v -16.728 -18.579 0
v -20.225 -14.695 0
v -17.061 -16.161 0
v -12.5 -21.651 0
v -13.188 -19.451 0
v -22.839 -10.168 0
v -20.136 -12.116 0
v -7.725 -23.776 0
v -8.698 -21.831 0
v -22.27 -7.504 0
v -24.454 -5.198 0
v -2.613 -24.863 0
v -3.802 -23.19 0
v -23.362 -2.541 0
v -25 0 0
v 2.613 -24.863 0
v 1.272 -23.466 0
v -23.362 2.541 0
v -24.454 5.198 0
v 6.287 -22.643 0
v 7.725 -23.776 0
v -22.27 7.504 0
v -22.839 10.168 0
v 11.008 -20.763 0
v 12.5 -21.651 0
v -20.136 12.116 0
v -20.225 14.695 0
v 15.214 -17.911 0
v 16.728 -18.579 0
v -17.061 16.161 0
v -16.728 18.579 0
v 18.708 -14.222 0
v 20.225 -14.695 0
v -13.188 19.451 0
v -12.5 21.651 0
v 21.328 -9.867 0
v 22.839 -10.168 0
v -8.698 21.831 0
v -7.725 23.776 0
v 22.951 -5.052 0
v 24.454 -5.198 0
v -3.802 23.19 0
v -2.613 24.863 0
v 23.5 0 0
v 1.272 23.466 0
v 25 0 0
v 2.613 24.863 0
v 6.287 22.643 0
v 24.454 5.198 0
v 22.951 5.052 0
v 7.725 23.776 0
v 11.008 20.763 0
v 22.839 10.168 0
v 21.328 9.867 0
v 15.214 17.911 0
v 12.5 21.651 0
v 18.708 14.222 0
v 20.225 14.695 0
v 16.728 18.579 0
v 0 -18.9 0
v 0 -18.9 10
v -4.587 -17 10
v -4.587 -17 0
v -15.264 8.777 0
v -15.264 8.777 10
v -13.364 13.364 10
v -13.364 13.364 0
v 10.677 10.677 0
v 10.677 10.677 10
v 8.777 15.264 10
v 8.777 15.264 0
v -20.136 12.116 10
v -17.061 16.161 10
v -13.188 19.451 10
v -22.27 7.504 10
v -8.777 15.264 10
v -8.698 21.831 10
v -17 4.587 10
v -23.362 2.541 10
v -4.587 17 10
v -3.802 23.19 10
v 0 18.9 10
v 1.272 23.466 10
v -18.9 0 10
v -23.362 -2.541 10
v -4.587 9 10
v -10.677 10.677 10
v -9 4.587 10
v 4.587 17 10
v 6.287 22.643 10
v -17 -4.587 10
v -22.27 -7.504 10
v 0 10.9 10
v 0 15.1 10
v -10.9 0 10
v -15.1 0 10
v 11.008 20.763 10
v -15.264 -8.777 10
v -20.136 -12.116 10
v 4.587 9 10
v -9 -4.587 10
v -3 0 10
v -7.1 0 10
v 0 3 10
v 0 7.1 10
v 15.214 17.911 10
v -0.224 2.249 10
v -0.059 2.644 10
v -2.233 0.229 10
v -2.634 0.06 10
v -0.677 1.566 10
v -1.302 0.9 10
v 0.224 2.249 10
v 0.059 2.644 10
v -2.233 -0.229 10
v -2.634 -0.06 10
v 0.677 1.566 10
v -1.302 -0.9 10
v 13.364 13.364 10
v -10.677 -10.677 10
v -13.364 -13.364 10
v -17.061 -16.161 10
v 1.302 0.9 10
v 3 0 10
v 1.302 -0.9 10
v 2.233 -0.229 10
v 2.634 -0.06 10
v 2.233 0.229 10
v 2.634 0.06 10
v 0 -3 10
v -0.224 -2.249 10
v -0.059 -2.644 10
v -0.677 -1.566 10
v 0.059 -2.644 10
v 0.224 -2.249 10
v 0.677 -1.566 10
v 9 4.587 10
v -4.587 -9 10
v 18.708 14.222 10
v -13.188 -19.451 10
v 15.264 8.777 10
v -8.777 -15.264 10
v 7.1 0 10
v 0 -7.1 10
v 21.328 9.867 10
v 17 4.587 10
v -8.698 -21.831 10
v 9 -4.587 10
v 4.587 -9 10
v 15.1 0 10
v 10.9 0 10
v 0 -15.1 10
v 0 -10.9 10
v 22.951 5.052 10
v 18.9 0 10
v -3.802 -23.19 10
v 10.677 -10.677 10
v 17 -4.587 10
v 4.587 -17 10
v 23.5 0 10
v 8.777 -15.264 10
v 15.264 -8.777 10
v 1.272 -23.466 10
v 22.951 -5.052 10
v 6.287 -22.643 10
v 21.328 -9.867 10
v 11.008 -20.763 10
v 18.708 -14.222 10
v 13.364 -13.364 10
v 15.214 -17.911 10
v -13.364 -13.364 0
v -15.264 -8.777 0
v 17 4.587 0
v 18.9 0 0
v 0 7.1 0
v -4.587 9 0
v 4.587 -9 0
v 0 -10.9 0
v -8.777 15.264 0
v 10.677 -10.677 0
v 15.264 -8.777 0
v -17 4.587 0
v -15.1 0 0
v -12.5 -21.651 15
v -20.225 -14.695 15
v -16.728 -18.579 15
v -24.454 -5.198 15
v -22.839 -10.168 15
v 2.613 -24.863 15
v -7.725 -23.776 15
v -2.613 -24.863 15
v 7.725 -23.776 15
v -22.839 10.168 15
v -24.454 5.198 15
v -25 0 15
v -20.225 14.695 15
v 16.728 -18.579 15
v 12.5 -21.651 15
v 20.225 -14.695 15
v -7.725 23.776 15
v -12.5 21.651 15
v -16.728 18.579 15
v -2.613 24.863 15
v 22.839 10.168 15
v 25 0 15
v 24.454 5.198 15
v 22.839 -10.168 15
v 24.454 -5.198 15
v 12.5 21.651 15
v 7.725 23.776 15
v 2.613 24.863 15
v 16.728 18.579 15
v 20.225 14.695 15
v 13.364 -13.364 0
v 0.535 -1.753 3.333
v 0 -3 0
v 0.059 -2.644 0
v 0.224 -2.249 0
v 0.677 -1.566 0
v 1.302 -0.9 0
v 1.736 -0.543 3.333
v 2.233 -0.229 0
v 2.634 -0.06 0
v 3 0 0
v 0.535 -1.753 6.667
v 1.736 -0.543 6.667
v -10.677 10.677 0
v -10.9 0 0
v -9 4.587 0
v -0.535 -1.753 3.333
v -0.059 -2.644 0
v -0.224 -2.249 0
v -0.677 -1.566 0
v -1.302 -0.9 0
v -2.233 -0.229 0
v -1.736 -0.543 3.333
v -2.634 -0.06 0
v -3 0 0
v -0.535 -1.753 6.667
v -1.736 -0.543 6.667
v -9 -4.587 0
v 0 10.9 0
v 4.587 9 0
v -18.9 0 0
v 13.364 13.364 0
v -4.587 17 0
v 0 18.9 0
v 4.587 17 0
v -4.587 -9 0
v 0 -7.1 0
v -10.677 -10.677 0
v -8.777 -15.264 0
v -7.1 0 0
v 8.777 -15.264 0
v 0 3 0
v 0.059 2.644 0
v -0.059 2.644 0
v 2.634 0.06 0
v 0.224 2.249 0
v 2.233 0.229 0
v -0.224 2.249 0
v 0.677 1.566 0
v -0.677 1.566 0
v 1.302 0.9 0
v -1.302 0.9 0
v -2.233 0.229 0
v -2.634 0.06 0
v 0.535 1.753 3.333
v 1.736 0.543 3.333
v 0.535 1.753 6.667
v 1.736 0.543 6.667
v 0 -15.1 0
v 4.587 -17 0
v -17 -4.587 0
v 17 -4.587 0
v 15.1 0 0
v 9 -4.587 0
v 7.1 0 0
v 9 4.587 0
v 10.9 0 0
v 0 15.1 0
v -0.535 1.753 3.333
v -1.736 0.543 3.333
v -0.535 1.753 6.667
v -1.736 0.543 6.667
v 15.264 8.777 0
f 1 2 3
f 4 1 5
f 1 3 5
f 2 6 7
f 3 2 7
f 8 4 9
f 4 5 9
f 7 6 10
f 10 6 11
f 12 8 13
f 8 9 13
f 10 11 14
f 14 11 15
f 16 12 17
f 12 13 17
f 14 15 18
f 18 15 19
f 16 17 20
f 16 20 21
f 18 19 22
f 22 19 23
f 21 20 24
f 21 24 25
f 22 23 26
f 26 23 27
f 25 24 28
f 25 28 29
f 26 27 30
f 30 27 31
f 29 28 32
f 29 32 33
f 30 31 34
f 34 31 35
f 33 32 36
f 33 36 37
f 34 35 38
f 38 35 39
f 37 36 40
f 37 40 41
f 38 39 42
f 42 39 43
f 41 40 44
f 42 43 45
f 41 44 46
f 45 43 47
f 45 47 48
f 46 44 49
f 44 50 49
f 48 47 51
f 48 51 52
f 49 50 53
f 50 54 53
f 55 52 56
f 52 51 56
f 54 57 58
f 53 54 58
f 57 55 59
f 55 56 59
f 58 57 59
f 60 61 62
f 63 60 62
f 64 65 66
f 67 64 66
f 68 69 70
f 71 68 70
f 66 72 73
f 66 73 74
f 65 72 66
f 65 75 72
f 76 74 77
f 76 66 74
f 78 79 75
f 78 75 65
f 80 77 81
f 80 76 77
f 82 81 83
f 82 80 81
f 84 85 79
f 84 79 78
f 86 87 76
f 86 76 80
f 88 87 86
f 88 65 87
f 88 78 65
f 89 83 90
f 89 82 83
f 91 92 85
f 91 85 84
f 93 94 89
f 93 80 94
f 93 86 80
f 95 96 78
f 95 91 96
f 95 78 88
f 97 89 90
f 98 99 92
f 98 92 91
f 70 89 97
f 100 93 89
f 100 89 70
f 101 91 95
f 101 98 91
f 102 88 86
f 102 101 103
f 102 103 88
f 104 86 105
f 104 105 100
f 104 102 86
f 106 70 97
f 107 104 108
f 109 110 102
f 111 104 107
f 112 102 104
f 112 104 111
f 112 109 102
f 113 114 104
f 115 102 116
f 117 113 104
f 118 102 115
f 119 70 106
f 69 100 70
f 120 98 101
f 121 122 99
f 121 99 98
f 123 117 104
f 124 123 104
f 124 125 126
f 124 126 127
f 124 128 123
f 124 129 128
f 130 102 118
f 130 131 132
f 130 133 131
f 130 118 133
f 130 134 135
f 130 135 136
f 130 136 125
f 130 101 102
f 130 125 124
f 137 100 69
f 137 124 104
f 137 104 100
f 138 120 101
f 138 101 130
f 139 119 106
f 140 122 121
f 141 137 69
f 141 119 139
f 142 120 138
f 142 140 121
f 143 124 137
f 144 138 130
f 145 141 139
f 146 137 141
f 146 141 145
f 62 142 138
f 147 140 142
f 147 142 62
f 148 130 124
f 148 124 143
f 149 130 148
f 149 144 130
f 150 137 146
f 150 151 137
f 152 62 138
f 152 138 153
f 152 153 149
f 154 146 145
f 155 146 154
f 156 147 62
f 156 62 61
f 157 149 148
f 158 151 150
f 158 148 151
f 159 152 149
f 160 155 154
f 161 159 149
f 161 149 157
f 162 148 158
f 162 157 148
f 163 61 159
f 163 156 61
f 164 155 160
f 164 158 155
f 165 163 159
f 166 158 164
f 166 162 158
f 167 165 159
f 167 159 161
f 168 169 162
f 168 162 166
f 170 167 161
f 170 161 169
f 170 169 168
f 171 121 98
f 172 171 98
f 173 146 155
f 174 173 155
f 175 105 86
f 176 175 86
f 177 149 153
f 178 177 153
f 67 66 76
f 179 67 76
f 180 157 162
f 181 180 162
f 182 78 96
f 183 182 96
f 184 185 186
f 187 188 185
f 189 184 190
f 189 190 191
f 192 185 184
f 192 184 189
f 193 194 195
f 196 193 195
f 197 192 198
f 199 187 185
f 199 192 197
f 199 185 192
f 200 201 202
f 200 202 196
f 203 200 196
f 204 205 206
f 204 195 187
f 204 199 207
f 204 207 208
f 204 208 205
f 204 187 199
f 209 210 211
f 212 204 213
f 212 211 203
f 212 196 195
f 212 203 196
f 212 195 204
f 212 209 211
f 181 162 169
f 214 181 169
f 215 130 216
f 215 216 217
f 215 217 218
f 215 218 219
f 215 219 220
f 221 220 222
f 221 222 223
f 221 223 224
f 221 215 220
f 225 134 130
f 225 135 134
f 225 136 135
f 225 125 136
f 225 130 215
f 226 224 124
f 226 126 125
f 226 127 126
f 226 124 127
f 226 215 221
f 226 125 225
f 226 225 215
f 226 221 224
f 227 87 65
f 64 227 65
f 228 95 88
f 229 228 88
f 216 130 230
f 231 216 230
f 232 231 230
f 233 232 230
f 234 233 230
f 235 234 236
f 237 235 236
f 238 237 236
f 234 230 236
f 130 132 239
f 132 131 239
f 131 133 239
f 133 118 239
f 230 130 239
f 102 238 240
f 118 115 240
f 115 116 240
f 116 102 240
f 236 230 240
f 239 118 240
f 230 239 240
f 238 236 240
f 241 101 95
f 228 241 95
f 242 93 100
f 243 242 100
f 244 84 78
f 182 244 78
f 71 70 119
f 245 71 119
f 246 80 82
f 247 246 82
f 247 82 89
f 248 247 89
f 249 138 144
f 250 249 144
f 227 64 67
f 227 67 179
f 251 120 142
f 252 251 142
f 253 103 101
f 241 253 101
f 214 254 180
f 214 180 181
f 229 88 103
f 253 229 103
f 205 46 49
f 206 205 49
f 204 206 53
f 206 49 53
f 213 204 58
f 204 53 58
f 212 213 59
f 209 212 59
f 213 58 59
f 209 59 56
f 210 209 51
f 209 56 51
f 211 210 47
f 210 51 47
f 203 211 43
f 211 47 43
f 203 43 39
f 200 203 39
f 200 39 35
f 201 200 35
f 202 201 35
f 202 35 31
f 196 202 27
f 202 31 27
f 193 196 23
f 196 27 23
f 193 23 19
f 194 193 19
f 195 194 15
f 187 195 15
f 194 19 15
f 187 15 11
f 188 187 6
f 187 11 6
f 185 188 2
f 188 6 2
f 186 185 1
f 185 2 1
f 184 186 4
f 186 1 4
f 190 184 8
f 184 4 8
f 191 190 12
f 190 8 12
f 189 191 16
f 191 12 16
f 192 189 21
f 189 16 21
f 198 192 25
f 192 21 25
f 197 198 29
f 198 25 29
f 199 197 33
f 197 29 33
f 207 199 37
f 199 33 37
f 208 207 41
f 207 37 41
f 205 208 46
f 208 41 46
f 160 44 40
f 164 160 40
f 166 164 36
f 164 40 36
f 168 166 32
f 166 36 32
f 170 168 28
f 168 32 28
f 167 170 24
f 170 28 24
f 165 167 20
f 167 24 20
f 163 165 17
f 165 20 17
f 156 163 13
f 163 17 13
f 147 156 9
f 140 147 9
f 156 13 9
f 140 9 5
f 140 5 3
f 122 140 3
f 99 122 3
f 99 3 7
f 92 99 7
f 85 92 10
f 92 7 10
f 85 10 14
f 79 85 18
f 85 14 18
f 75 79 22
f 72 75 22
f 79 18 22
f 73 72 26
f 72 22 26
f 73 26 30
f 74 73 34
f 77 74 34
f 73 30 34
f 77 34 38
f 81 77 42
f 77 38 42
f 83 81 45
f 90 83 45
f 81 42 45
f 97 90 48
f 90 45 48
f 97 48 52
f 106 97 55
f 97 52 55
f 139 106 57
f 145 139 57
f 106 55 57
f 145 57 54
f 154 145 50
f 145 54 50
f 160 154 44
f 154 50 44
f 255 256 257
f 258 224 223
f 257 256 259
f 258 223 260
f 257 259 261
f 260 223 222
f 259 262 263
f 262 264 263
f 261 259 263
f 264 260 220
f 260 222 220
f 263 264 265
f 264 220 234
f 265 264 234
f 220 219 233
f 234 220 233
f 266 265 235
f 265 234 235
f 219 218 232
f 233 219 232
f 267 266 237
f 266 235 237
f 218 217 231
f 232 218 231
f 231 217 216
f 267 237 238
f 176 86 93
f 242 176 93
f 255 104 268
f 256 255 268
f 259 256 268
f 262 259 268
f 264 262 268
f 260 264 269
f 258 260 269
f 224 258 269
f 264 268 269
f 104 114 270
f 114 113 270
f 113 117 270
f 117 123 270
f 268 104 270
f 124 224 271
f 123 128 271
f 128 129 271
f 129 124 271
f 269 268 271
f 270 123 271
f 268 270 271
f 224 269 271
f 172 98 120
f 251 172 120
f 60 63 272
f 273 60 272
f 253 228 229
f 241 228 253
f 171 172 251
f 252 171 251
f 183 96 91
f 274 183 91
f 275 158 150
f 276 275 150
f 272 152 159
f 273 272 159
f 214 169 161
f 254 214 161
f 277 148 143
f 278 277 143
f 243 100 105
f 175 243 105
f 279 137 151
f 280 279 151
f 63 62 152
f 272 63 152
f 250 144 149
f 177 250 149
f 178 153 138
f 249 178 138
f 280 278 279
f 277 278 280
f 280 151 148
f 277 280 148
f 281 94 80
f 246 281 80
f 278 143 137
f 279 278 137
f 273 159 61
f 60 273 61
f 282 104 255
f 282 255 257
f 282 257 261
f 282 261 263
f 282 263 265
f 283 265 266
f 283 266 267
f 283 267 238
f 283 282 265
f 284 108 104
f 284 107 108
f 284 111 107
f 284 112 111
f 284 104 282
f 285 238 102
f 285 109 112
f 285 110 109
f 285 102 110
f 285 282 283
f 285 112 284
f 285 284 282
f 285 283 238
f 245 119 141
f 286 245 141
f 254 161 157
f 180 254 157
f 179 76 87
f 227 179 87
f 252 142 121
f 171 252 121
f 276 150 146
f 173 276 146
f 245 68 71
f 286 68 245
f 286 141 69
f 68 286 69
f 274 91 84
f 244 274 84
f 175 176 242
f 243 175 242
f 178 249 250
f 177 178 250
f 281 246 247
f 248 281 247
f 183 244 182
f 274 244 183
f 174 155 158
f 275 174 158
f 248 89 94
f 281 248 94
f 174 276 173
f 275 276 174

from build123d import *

# Parameters (mm, degrees)
F0_R     = 25
F1_DEPTH = 15
F2_R     = 23.5
F3_DEPTH = 10
F6_DEPTH = 10
F7_DEPTH = 10


with BuildPart() as f1:
    # F0 (on Top) → F1 (new body)
    with BuildSketch(Plane.XY):
        Circle(F0_R)
    extrude(amount=F1_DEPTH)

    # F2 (on face) → F3 (cut)
    with BuildSketch(Plane(origin=(0, 0, 0), x_dir=(1, 0, 0), z_dir=(0, 0, -1))):
        Circle(F2_R)
    extrude(amount=-F3_DEPTH, mode=Mode.SUBTRACT)

    # F5 (on face) → F6 (join)
    with BuildSketch(Plane(origin=(0, 0, 10), x_dir=(1, 0, 0), z_dir=(0, 0, -1))):
        Polygon((0, -10.9), (4.5870057685, -9), (0, -7.1), (-4.5870057685, -9), align=None)
        Polygon((7.1, 0), (9, -4.5870057685), (10.9, 0), (9, 4.5870057685), align=None)
        Polygon((0, 7.1), (4.5870057685, 9), (0, 10.9), (-4.5870057685, 9), align=None)
        Polygon((-7.1, 0), (-9, 4.5870057685), (-10.9, 0), (-9, -4.5870057685), align=None)
        Polygon((0, 15.1), (4.5870057685, 17), (0, 18.9), (-4.5870057685, 17), align=None)
        Polygon((-15.2643181644, 8.7773123959), (-10.6773123959, 10.6773123959), (-8.7773123959, 15.2643181644), (-13.3643181644, 13.3643181644), align=None)
        Polygon((-17, -4.5870057685), (-15.1, 0), (-17, 4.5870057685), (-18.9, 0), align=None)
        Polygon((-8.7773123959, -15.2643181644), (-10.6773123959, -10.6773123959), (-15.2643181644, -8.7773123959), (-13.3643181644, -13.3643181644), align=None)
        Polygon((4.5870057685, -17), (0, -15.1), (-4.5870057685, -17), (0, -18.9), align=None)
        Polygon((15.2643181644, -8.7773123959), (10.6773123959, -10.6773123959), (8.7773123959, -15.2643181644), (13.3643181644, -13.3643181644), align=None)
        Polygon((17, 4.5870057685), (15.1, 0), (17, -4.5870057685), (18.9, 0), align=None)
        Polygon((8.7773123959, 15.2643181644), (10.6773123959, 10.6773123959), (15.2643181644, 8.7773123959), (13.3643181644, 13.3643181644), align=None)
    extrude(amount=F6_DEPTH)

    # F4 (on face) → F7 (join)
    with BuildSketch(Plane(origin=(0, 0, 10), x_dir=(1, 0, 0), z_dir=(0, 0, -1))):
        with BuildLine():
            add(Edge.make_bspline(
                [(0, 3), (0, 1.9449878018), (1.905477955, 0), (3, 0)],
                knots=[0, 0, 0, 0, 4.2426406871, 4.2426406871, 4.2426406871, 4.2426406871], degree=3))
            add(Edge.make_bspline(
                [(0, 3), (0, 1.9449878018), (-1.905477955, 0), (-3, 0)],
                knots=[0, 0, 0, 0, 4.2426406871, 4.2426406871, 4.2426406871, 4.2426406871], degree=3))
            add(Edge.make_bspline(
                [(0, -3), (0, -1.9449878018), (-1.905477955, 0), (-3, 0)],
                knots=[0, 0, 0, 0, 4.2426406871, 4.2426406871, 4.2426406871, 4.2426406871], degree=3))
            add(Edge.make_bspline(
                [(0, -3), (0, -1.9449878018), (1.905477955, 0), (3, 0)],
                knots=[0, 0, 0, 0, 4.2426406871, 4.2426406871, 4.2426406871, 4.2426406871], degree=3))
        make_face()
    extrude(amount=F7_DEPTH)


solid = f1.part
